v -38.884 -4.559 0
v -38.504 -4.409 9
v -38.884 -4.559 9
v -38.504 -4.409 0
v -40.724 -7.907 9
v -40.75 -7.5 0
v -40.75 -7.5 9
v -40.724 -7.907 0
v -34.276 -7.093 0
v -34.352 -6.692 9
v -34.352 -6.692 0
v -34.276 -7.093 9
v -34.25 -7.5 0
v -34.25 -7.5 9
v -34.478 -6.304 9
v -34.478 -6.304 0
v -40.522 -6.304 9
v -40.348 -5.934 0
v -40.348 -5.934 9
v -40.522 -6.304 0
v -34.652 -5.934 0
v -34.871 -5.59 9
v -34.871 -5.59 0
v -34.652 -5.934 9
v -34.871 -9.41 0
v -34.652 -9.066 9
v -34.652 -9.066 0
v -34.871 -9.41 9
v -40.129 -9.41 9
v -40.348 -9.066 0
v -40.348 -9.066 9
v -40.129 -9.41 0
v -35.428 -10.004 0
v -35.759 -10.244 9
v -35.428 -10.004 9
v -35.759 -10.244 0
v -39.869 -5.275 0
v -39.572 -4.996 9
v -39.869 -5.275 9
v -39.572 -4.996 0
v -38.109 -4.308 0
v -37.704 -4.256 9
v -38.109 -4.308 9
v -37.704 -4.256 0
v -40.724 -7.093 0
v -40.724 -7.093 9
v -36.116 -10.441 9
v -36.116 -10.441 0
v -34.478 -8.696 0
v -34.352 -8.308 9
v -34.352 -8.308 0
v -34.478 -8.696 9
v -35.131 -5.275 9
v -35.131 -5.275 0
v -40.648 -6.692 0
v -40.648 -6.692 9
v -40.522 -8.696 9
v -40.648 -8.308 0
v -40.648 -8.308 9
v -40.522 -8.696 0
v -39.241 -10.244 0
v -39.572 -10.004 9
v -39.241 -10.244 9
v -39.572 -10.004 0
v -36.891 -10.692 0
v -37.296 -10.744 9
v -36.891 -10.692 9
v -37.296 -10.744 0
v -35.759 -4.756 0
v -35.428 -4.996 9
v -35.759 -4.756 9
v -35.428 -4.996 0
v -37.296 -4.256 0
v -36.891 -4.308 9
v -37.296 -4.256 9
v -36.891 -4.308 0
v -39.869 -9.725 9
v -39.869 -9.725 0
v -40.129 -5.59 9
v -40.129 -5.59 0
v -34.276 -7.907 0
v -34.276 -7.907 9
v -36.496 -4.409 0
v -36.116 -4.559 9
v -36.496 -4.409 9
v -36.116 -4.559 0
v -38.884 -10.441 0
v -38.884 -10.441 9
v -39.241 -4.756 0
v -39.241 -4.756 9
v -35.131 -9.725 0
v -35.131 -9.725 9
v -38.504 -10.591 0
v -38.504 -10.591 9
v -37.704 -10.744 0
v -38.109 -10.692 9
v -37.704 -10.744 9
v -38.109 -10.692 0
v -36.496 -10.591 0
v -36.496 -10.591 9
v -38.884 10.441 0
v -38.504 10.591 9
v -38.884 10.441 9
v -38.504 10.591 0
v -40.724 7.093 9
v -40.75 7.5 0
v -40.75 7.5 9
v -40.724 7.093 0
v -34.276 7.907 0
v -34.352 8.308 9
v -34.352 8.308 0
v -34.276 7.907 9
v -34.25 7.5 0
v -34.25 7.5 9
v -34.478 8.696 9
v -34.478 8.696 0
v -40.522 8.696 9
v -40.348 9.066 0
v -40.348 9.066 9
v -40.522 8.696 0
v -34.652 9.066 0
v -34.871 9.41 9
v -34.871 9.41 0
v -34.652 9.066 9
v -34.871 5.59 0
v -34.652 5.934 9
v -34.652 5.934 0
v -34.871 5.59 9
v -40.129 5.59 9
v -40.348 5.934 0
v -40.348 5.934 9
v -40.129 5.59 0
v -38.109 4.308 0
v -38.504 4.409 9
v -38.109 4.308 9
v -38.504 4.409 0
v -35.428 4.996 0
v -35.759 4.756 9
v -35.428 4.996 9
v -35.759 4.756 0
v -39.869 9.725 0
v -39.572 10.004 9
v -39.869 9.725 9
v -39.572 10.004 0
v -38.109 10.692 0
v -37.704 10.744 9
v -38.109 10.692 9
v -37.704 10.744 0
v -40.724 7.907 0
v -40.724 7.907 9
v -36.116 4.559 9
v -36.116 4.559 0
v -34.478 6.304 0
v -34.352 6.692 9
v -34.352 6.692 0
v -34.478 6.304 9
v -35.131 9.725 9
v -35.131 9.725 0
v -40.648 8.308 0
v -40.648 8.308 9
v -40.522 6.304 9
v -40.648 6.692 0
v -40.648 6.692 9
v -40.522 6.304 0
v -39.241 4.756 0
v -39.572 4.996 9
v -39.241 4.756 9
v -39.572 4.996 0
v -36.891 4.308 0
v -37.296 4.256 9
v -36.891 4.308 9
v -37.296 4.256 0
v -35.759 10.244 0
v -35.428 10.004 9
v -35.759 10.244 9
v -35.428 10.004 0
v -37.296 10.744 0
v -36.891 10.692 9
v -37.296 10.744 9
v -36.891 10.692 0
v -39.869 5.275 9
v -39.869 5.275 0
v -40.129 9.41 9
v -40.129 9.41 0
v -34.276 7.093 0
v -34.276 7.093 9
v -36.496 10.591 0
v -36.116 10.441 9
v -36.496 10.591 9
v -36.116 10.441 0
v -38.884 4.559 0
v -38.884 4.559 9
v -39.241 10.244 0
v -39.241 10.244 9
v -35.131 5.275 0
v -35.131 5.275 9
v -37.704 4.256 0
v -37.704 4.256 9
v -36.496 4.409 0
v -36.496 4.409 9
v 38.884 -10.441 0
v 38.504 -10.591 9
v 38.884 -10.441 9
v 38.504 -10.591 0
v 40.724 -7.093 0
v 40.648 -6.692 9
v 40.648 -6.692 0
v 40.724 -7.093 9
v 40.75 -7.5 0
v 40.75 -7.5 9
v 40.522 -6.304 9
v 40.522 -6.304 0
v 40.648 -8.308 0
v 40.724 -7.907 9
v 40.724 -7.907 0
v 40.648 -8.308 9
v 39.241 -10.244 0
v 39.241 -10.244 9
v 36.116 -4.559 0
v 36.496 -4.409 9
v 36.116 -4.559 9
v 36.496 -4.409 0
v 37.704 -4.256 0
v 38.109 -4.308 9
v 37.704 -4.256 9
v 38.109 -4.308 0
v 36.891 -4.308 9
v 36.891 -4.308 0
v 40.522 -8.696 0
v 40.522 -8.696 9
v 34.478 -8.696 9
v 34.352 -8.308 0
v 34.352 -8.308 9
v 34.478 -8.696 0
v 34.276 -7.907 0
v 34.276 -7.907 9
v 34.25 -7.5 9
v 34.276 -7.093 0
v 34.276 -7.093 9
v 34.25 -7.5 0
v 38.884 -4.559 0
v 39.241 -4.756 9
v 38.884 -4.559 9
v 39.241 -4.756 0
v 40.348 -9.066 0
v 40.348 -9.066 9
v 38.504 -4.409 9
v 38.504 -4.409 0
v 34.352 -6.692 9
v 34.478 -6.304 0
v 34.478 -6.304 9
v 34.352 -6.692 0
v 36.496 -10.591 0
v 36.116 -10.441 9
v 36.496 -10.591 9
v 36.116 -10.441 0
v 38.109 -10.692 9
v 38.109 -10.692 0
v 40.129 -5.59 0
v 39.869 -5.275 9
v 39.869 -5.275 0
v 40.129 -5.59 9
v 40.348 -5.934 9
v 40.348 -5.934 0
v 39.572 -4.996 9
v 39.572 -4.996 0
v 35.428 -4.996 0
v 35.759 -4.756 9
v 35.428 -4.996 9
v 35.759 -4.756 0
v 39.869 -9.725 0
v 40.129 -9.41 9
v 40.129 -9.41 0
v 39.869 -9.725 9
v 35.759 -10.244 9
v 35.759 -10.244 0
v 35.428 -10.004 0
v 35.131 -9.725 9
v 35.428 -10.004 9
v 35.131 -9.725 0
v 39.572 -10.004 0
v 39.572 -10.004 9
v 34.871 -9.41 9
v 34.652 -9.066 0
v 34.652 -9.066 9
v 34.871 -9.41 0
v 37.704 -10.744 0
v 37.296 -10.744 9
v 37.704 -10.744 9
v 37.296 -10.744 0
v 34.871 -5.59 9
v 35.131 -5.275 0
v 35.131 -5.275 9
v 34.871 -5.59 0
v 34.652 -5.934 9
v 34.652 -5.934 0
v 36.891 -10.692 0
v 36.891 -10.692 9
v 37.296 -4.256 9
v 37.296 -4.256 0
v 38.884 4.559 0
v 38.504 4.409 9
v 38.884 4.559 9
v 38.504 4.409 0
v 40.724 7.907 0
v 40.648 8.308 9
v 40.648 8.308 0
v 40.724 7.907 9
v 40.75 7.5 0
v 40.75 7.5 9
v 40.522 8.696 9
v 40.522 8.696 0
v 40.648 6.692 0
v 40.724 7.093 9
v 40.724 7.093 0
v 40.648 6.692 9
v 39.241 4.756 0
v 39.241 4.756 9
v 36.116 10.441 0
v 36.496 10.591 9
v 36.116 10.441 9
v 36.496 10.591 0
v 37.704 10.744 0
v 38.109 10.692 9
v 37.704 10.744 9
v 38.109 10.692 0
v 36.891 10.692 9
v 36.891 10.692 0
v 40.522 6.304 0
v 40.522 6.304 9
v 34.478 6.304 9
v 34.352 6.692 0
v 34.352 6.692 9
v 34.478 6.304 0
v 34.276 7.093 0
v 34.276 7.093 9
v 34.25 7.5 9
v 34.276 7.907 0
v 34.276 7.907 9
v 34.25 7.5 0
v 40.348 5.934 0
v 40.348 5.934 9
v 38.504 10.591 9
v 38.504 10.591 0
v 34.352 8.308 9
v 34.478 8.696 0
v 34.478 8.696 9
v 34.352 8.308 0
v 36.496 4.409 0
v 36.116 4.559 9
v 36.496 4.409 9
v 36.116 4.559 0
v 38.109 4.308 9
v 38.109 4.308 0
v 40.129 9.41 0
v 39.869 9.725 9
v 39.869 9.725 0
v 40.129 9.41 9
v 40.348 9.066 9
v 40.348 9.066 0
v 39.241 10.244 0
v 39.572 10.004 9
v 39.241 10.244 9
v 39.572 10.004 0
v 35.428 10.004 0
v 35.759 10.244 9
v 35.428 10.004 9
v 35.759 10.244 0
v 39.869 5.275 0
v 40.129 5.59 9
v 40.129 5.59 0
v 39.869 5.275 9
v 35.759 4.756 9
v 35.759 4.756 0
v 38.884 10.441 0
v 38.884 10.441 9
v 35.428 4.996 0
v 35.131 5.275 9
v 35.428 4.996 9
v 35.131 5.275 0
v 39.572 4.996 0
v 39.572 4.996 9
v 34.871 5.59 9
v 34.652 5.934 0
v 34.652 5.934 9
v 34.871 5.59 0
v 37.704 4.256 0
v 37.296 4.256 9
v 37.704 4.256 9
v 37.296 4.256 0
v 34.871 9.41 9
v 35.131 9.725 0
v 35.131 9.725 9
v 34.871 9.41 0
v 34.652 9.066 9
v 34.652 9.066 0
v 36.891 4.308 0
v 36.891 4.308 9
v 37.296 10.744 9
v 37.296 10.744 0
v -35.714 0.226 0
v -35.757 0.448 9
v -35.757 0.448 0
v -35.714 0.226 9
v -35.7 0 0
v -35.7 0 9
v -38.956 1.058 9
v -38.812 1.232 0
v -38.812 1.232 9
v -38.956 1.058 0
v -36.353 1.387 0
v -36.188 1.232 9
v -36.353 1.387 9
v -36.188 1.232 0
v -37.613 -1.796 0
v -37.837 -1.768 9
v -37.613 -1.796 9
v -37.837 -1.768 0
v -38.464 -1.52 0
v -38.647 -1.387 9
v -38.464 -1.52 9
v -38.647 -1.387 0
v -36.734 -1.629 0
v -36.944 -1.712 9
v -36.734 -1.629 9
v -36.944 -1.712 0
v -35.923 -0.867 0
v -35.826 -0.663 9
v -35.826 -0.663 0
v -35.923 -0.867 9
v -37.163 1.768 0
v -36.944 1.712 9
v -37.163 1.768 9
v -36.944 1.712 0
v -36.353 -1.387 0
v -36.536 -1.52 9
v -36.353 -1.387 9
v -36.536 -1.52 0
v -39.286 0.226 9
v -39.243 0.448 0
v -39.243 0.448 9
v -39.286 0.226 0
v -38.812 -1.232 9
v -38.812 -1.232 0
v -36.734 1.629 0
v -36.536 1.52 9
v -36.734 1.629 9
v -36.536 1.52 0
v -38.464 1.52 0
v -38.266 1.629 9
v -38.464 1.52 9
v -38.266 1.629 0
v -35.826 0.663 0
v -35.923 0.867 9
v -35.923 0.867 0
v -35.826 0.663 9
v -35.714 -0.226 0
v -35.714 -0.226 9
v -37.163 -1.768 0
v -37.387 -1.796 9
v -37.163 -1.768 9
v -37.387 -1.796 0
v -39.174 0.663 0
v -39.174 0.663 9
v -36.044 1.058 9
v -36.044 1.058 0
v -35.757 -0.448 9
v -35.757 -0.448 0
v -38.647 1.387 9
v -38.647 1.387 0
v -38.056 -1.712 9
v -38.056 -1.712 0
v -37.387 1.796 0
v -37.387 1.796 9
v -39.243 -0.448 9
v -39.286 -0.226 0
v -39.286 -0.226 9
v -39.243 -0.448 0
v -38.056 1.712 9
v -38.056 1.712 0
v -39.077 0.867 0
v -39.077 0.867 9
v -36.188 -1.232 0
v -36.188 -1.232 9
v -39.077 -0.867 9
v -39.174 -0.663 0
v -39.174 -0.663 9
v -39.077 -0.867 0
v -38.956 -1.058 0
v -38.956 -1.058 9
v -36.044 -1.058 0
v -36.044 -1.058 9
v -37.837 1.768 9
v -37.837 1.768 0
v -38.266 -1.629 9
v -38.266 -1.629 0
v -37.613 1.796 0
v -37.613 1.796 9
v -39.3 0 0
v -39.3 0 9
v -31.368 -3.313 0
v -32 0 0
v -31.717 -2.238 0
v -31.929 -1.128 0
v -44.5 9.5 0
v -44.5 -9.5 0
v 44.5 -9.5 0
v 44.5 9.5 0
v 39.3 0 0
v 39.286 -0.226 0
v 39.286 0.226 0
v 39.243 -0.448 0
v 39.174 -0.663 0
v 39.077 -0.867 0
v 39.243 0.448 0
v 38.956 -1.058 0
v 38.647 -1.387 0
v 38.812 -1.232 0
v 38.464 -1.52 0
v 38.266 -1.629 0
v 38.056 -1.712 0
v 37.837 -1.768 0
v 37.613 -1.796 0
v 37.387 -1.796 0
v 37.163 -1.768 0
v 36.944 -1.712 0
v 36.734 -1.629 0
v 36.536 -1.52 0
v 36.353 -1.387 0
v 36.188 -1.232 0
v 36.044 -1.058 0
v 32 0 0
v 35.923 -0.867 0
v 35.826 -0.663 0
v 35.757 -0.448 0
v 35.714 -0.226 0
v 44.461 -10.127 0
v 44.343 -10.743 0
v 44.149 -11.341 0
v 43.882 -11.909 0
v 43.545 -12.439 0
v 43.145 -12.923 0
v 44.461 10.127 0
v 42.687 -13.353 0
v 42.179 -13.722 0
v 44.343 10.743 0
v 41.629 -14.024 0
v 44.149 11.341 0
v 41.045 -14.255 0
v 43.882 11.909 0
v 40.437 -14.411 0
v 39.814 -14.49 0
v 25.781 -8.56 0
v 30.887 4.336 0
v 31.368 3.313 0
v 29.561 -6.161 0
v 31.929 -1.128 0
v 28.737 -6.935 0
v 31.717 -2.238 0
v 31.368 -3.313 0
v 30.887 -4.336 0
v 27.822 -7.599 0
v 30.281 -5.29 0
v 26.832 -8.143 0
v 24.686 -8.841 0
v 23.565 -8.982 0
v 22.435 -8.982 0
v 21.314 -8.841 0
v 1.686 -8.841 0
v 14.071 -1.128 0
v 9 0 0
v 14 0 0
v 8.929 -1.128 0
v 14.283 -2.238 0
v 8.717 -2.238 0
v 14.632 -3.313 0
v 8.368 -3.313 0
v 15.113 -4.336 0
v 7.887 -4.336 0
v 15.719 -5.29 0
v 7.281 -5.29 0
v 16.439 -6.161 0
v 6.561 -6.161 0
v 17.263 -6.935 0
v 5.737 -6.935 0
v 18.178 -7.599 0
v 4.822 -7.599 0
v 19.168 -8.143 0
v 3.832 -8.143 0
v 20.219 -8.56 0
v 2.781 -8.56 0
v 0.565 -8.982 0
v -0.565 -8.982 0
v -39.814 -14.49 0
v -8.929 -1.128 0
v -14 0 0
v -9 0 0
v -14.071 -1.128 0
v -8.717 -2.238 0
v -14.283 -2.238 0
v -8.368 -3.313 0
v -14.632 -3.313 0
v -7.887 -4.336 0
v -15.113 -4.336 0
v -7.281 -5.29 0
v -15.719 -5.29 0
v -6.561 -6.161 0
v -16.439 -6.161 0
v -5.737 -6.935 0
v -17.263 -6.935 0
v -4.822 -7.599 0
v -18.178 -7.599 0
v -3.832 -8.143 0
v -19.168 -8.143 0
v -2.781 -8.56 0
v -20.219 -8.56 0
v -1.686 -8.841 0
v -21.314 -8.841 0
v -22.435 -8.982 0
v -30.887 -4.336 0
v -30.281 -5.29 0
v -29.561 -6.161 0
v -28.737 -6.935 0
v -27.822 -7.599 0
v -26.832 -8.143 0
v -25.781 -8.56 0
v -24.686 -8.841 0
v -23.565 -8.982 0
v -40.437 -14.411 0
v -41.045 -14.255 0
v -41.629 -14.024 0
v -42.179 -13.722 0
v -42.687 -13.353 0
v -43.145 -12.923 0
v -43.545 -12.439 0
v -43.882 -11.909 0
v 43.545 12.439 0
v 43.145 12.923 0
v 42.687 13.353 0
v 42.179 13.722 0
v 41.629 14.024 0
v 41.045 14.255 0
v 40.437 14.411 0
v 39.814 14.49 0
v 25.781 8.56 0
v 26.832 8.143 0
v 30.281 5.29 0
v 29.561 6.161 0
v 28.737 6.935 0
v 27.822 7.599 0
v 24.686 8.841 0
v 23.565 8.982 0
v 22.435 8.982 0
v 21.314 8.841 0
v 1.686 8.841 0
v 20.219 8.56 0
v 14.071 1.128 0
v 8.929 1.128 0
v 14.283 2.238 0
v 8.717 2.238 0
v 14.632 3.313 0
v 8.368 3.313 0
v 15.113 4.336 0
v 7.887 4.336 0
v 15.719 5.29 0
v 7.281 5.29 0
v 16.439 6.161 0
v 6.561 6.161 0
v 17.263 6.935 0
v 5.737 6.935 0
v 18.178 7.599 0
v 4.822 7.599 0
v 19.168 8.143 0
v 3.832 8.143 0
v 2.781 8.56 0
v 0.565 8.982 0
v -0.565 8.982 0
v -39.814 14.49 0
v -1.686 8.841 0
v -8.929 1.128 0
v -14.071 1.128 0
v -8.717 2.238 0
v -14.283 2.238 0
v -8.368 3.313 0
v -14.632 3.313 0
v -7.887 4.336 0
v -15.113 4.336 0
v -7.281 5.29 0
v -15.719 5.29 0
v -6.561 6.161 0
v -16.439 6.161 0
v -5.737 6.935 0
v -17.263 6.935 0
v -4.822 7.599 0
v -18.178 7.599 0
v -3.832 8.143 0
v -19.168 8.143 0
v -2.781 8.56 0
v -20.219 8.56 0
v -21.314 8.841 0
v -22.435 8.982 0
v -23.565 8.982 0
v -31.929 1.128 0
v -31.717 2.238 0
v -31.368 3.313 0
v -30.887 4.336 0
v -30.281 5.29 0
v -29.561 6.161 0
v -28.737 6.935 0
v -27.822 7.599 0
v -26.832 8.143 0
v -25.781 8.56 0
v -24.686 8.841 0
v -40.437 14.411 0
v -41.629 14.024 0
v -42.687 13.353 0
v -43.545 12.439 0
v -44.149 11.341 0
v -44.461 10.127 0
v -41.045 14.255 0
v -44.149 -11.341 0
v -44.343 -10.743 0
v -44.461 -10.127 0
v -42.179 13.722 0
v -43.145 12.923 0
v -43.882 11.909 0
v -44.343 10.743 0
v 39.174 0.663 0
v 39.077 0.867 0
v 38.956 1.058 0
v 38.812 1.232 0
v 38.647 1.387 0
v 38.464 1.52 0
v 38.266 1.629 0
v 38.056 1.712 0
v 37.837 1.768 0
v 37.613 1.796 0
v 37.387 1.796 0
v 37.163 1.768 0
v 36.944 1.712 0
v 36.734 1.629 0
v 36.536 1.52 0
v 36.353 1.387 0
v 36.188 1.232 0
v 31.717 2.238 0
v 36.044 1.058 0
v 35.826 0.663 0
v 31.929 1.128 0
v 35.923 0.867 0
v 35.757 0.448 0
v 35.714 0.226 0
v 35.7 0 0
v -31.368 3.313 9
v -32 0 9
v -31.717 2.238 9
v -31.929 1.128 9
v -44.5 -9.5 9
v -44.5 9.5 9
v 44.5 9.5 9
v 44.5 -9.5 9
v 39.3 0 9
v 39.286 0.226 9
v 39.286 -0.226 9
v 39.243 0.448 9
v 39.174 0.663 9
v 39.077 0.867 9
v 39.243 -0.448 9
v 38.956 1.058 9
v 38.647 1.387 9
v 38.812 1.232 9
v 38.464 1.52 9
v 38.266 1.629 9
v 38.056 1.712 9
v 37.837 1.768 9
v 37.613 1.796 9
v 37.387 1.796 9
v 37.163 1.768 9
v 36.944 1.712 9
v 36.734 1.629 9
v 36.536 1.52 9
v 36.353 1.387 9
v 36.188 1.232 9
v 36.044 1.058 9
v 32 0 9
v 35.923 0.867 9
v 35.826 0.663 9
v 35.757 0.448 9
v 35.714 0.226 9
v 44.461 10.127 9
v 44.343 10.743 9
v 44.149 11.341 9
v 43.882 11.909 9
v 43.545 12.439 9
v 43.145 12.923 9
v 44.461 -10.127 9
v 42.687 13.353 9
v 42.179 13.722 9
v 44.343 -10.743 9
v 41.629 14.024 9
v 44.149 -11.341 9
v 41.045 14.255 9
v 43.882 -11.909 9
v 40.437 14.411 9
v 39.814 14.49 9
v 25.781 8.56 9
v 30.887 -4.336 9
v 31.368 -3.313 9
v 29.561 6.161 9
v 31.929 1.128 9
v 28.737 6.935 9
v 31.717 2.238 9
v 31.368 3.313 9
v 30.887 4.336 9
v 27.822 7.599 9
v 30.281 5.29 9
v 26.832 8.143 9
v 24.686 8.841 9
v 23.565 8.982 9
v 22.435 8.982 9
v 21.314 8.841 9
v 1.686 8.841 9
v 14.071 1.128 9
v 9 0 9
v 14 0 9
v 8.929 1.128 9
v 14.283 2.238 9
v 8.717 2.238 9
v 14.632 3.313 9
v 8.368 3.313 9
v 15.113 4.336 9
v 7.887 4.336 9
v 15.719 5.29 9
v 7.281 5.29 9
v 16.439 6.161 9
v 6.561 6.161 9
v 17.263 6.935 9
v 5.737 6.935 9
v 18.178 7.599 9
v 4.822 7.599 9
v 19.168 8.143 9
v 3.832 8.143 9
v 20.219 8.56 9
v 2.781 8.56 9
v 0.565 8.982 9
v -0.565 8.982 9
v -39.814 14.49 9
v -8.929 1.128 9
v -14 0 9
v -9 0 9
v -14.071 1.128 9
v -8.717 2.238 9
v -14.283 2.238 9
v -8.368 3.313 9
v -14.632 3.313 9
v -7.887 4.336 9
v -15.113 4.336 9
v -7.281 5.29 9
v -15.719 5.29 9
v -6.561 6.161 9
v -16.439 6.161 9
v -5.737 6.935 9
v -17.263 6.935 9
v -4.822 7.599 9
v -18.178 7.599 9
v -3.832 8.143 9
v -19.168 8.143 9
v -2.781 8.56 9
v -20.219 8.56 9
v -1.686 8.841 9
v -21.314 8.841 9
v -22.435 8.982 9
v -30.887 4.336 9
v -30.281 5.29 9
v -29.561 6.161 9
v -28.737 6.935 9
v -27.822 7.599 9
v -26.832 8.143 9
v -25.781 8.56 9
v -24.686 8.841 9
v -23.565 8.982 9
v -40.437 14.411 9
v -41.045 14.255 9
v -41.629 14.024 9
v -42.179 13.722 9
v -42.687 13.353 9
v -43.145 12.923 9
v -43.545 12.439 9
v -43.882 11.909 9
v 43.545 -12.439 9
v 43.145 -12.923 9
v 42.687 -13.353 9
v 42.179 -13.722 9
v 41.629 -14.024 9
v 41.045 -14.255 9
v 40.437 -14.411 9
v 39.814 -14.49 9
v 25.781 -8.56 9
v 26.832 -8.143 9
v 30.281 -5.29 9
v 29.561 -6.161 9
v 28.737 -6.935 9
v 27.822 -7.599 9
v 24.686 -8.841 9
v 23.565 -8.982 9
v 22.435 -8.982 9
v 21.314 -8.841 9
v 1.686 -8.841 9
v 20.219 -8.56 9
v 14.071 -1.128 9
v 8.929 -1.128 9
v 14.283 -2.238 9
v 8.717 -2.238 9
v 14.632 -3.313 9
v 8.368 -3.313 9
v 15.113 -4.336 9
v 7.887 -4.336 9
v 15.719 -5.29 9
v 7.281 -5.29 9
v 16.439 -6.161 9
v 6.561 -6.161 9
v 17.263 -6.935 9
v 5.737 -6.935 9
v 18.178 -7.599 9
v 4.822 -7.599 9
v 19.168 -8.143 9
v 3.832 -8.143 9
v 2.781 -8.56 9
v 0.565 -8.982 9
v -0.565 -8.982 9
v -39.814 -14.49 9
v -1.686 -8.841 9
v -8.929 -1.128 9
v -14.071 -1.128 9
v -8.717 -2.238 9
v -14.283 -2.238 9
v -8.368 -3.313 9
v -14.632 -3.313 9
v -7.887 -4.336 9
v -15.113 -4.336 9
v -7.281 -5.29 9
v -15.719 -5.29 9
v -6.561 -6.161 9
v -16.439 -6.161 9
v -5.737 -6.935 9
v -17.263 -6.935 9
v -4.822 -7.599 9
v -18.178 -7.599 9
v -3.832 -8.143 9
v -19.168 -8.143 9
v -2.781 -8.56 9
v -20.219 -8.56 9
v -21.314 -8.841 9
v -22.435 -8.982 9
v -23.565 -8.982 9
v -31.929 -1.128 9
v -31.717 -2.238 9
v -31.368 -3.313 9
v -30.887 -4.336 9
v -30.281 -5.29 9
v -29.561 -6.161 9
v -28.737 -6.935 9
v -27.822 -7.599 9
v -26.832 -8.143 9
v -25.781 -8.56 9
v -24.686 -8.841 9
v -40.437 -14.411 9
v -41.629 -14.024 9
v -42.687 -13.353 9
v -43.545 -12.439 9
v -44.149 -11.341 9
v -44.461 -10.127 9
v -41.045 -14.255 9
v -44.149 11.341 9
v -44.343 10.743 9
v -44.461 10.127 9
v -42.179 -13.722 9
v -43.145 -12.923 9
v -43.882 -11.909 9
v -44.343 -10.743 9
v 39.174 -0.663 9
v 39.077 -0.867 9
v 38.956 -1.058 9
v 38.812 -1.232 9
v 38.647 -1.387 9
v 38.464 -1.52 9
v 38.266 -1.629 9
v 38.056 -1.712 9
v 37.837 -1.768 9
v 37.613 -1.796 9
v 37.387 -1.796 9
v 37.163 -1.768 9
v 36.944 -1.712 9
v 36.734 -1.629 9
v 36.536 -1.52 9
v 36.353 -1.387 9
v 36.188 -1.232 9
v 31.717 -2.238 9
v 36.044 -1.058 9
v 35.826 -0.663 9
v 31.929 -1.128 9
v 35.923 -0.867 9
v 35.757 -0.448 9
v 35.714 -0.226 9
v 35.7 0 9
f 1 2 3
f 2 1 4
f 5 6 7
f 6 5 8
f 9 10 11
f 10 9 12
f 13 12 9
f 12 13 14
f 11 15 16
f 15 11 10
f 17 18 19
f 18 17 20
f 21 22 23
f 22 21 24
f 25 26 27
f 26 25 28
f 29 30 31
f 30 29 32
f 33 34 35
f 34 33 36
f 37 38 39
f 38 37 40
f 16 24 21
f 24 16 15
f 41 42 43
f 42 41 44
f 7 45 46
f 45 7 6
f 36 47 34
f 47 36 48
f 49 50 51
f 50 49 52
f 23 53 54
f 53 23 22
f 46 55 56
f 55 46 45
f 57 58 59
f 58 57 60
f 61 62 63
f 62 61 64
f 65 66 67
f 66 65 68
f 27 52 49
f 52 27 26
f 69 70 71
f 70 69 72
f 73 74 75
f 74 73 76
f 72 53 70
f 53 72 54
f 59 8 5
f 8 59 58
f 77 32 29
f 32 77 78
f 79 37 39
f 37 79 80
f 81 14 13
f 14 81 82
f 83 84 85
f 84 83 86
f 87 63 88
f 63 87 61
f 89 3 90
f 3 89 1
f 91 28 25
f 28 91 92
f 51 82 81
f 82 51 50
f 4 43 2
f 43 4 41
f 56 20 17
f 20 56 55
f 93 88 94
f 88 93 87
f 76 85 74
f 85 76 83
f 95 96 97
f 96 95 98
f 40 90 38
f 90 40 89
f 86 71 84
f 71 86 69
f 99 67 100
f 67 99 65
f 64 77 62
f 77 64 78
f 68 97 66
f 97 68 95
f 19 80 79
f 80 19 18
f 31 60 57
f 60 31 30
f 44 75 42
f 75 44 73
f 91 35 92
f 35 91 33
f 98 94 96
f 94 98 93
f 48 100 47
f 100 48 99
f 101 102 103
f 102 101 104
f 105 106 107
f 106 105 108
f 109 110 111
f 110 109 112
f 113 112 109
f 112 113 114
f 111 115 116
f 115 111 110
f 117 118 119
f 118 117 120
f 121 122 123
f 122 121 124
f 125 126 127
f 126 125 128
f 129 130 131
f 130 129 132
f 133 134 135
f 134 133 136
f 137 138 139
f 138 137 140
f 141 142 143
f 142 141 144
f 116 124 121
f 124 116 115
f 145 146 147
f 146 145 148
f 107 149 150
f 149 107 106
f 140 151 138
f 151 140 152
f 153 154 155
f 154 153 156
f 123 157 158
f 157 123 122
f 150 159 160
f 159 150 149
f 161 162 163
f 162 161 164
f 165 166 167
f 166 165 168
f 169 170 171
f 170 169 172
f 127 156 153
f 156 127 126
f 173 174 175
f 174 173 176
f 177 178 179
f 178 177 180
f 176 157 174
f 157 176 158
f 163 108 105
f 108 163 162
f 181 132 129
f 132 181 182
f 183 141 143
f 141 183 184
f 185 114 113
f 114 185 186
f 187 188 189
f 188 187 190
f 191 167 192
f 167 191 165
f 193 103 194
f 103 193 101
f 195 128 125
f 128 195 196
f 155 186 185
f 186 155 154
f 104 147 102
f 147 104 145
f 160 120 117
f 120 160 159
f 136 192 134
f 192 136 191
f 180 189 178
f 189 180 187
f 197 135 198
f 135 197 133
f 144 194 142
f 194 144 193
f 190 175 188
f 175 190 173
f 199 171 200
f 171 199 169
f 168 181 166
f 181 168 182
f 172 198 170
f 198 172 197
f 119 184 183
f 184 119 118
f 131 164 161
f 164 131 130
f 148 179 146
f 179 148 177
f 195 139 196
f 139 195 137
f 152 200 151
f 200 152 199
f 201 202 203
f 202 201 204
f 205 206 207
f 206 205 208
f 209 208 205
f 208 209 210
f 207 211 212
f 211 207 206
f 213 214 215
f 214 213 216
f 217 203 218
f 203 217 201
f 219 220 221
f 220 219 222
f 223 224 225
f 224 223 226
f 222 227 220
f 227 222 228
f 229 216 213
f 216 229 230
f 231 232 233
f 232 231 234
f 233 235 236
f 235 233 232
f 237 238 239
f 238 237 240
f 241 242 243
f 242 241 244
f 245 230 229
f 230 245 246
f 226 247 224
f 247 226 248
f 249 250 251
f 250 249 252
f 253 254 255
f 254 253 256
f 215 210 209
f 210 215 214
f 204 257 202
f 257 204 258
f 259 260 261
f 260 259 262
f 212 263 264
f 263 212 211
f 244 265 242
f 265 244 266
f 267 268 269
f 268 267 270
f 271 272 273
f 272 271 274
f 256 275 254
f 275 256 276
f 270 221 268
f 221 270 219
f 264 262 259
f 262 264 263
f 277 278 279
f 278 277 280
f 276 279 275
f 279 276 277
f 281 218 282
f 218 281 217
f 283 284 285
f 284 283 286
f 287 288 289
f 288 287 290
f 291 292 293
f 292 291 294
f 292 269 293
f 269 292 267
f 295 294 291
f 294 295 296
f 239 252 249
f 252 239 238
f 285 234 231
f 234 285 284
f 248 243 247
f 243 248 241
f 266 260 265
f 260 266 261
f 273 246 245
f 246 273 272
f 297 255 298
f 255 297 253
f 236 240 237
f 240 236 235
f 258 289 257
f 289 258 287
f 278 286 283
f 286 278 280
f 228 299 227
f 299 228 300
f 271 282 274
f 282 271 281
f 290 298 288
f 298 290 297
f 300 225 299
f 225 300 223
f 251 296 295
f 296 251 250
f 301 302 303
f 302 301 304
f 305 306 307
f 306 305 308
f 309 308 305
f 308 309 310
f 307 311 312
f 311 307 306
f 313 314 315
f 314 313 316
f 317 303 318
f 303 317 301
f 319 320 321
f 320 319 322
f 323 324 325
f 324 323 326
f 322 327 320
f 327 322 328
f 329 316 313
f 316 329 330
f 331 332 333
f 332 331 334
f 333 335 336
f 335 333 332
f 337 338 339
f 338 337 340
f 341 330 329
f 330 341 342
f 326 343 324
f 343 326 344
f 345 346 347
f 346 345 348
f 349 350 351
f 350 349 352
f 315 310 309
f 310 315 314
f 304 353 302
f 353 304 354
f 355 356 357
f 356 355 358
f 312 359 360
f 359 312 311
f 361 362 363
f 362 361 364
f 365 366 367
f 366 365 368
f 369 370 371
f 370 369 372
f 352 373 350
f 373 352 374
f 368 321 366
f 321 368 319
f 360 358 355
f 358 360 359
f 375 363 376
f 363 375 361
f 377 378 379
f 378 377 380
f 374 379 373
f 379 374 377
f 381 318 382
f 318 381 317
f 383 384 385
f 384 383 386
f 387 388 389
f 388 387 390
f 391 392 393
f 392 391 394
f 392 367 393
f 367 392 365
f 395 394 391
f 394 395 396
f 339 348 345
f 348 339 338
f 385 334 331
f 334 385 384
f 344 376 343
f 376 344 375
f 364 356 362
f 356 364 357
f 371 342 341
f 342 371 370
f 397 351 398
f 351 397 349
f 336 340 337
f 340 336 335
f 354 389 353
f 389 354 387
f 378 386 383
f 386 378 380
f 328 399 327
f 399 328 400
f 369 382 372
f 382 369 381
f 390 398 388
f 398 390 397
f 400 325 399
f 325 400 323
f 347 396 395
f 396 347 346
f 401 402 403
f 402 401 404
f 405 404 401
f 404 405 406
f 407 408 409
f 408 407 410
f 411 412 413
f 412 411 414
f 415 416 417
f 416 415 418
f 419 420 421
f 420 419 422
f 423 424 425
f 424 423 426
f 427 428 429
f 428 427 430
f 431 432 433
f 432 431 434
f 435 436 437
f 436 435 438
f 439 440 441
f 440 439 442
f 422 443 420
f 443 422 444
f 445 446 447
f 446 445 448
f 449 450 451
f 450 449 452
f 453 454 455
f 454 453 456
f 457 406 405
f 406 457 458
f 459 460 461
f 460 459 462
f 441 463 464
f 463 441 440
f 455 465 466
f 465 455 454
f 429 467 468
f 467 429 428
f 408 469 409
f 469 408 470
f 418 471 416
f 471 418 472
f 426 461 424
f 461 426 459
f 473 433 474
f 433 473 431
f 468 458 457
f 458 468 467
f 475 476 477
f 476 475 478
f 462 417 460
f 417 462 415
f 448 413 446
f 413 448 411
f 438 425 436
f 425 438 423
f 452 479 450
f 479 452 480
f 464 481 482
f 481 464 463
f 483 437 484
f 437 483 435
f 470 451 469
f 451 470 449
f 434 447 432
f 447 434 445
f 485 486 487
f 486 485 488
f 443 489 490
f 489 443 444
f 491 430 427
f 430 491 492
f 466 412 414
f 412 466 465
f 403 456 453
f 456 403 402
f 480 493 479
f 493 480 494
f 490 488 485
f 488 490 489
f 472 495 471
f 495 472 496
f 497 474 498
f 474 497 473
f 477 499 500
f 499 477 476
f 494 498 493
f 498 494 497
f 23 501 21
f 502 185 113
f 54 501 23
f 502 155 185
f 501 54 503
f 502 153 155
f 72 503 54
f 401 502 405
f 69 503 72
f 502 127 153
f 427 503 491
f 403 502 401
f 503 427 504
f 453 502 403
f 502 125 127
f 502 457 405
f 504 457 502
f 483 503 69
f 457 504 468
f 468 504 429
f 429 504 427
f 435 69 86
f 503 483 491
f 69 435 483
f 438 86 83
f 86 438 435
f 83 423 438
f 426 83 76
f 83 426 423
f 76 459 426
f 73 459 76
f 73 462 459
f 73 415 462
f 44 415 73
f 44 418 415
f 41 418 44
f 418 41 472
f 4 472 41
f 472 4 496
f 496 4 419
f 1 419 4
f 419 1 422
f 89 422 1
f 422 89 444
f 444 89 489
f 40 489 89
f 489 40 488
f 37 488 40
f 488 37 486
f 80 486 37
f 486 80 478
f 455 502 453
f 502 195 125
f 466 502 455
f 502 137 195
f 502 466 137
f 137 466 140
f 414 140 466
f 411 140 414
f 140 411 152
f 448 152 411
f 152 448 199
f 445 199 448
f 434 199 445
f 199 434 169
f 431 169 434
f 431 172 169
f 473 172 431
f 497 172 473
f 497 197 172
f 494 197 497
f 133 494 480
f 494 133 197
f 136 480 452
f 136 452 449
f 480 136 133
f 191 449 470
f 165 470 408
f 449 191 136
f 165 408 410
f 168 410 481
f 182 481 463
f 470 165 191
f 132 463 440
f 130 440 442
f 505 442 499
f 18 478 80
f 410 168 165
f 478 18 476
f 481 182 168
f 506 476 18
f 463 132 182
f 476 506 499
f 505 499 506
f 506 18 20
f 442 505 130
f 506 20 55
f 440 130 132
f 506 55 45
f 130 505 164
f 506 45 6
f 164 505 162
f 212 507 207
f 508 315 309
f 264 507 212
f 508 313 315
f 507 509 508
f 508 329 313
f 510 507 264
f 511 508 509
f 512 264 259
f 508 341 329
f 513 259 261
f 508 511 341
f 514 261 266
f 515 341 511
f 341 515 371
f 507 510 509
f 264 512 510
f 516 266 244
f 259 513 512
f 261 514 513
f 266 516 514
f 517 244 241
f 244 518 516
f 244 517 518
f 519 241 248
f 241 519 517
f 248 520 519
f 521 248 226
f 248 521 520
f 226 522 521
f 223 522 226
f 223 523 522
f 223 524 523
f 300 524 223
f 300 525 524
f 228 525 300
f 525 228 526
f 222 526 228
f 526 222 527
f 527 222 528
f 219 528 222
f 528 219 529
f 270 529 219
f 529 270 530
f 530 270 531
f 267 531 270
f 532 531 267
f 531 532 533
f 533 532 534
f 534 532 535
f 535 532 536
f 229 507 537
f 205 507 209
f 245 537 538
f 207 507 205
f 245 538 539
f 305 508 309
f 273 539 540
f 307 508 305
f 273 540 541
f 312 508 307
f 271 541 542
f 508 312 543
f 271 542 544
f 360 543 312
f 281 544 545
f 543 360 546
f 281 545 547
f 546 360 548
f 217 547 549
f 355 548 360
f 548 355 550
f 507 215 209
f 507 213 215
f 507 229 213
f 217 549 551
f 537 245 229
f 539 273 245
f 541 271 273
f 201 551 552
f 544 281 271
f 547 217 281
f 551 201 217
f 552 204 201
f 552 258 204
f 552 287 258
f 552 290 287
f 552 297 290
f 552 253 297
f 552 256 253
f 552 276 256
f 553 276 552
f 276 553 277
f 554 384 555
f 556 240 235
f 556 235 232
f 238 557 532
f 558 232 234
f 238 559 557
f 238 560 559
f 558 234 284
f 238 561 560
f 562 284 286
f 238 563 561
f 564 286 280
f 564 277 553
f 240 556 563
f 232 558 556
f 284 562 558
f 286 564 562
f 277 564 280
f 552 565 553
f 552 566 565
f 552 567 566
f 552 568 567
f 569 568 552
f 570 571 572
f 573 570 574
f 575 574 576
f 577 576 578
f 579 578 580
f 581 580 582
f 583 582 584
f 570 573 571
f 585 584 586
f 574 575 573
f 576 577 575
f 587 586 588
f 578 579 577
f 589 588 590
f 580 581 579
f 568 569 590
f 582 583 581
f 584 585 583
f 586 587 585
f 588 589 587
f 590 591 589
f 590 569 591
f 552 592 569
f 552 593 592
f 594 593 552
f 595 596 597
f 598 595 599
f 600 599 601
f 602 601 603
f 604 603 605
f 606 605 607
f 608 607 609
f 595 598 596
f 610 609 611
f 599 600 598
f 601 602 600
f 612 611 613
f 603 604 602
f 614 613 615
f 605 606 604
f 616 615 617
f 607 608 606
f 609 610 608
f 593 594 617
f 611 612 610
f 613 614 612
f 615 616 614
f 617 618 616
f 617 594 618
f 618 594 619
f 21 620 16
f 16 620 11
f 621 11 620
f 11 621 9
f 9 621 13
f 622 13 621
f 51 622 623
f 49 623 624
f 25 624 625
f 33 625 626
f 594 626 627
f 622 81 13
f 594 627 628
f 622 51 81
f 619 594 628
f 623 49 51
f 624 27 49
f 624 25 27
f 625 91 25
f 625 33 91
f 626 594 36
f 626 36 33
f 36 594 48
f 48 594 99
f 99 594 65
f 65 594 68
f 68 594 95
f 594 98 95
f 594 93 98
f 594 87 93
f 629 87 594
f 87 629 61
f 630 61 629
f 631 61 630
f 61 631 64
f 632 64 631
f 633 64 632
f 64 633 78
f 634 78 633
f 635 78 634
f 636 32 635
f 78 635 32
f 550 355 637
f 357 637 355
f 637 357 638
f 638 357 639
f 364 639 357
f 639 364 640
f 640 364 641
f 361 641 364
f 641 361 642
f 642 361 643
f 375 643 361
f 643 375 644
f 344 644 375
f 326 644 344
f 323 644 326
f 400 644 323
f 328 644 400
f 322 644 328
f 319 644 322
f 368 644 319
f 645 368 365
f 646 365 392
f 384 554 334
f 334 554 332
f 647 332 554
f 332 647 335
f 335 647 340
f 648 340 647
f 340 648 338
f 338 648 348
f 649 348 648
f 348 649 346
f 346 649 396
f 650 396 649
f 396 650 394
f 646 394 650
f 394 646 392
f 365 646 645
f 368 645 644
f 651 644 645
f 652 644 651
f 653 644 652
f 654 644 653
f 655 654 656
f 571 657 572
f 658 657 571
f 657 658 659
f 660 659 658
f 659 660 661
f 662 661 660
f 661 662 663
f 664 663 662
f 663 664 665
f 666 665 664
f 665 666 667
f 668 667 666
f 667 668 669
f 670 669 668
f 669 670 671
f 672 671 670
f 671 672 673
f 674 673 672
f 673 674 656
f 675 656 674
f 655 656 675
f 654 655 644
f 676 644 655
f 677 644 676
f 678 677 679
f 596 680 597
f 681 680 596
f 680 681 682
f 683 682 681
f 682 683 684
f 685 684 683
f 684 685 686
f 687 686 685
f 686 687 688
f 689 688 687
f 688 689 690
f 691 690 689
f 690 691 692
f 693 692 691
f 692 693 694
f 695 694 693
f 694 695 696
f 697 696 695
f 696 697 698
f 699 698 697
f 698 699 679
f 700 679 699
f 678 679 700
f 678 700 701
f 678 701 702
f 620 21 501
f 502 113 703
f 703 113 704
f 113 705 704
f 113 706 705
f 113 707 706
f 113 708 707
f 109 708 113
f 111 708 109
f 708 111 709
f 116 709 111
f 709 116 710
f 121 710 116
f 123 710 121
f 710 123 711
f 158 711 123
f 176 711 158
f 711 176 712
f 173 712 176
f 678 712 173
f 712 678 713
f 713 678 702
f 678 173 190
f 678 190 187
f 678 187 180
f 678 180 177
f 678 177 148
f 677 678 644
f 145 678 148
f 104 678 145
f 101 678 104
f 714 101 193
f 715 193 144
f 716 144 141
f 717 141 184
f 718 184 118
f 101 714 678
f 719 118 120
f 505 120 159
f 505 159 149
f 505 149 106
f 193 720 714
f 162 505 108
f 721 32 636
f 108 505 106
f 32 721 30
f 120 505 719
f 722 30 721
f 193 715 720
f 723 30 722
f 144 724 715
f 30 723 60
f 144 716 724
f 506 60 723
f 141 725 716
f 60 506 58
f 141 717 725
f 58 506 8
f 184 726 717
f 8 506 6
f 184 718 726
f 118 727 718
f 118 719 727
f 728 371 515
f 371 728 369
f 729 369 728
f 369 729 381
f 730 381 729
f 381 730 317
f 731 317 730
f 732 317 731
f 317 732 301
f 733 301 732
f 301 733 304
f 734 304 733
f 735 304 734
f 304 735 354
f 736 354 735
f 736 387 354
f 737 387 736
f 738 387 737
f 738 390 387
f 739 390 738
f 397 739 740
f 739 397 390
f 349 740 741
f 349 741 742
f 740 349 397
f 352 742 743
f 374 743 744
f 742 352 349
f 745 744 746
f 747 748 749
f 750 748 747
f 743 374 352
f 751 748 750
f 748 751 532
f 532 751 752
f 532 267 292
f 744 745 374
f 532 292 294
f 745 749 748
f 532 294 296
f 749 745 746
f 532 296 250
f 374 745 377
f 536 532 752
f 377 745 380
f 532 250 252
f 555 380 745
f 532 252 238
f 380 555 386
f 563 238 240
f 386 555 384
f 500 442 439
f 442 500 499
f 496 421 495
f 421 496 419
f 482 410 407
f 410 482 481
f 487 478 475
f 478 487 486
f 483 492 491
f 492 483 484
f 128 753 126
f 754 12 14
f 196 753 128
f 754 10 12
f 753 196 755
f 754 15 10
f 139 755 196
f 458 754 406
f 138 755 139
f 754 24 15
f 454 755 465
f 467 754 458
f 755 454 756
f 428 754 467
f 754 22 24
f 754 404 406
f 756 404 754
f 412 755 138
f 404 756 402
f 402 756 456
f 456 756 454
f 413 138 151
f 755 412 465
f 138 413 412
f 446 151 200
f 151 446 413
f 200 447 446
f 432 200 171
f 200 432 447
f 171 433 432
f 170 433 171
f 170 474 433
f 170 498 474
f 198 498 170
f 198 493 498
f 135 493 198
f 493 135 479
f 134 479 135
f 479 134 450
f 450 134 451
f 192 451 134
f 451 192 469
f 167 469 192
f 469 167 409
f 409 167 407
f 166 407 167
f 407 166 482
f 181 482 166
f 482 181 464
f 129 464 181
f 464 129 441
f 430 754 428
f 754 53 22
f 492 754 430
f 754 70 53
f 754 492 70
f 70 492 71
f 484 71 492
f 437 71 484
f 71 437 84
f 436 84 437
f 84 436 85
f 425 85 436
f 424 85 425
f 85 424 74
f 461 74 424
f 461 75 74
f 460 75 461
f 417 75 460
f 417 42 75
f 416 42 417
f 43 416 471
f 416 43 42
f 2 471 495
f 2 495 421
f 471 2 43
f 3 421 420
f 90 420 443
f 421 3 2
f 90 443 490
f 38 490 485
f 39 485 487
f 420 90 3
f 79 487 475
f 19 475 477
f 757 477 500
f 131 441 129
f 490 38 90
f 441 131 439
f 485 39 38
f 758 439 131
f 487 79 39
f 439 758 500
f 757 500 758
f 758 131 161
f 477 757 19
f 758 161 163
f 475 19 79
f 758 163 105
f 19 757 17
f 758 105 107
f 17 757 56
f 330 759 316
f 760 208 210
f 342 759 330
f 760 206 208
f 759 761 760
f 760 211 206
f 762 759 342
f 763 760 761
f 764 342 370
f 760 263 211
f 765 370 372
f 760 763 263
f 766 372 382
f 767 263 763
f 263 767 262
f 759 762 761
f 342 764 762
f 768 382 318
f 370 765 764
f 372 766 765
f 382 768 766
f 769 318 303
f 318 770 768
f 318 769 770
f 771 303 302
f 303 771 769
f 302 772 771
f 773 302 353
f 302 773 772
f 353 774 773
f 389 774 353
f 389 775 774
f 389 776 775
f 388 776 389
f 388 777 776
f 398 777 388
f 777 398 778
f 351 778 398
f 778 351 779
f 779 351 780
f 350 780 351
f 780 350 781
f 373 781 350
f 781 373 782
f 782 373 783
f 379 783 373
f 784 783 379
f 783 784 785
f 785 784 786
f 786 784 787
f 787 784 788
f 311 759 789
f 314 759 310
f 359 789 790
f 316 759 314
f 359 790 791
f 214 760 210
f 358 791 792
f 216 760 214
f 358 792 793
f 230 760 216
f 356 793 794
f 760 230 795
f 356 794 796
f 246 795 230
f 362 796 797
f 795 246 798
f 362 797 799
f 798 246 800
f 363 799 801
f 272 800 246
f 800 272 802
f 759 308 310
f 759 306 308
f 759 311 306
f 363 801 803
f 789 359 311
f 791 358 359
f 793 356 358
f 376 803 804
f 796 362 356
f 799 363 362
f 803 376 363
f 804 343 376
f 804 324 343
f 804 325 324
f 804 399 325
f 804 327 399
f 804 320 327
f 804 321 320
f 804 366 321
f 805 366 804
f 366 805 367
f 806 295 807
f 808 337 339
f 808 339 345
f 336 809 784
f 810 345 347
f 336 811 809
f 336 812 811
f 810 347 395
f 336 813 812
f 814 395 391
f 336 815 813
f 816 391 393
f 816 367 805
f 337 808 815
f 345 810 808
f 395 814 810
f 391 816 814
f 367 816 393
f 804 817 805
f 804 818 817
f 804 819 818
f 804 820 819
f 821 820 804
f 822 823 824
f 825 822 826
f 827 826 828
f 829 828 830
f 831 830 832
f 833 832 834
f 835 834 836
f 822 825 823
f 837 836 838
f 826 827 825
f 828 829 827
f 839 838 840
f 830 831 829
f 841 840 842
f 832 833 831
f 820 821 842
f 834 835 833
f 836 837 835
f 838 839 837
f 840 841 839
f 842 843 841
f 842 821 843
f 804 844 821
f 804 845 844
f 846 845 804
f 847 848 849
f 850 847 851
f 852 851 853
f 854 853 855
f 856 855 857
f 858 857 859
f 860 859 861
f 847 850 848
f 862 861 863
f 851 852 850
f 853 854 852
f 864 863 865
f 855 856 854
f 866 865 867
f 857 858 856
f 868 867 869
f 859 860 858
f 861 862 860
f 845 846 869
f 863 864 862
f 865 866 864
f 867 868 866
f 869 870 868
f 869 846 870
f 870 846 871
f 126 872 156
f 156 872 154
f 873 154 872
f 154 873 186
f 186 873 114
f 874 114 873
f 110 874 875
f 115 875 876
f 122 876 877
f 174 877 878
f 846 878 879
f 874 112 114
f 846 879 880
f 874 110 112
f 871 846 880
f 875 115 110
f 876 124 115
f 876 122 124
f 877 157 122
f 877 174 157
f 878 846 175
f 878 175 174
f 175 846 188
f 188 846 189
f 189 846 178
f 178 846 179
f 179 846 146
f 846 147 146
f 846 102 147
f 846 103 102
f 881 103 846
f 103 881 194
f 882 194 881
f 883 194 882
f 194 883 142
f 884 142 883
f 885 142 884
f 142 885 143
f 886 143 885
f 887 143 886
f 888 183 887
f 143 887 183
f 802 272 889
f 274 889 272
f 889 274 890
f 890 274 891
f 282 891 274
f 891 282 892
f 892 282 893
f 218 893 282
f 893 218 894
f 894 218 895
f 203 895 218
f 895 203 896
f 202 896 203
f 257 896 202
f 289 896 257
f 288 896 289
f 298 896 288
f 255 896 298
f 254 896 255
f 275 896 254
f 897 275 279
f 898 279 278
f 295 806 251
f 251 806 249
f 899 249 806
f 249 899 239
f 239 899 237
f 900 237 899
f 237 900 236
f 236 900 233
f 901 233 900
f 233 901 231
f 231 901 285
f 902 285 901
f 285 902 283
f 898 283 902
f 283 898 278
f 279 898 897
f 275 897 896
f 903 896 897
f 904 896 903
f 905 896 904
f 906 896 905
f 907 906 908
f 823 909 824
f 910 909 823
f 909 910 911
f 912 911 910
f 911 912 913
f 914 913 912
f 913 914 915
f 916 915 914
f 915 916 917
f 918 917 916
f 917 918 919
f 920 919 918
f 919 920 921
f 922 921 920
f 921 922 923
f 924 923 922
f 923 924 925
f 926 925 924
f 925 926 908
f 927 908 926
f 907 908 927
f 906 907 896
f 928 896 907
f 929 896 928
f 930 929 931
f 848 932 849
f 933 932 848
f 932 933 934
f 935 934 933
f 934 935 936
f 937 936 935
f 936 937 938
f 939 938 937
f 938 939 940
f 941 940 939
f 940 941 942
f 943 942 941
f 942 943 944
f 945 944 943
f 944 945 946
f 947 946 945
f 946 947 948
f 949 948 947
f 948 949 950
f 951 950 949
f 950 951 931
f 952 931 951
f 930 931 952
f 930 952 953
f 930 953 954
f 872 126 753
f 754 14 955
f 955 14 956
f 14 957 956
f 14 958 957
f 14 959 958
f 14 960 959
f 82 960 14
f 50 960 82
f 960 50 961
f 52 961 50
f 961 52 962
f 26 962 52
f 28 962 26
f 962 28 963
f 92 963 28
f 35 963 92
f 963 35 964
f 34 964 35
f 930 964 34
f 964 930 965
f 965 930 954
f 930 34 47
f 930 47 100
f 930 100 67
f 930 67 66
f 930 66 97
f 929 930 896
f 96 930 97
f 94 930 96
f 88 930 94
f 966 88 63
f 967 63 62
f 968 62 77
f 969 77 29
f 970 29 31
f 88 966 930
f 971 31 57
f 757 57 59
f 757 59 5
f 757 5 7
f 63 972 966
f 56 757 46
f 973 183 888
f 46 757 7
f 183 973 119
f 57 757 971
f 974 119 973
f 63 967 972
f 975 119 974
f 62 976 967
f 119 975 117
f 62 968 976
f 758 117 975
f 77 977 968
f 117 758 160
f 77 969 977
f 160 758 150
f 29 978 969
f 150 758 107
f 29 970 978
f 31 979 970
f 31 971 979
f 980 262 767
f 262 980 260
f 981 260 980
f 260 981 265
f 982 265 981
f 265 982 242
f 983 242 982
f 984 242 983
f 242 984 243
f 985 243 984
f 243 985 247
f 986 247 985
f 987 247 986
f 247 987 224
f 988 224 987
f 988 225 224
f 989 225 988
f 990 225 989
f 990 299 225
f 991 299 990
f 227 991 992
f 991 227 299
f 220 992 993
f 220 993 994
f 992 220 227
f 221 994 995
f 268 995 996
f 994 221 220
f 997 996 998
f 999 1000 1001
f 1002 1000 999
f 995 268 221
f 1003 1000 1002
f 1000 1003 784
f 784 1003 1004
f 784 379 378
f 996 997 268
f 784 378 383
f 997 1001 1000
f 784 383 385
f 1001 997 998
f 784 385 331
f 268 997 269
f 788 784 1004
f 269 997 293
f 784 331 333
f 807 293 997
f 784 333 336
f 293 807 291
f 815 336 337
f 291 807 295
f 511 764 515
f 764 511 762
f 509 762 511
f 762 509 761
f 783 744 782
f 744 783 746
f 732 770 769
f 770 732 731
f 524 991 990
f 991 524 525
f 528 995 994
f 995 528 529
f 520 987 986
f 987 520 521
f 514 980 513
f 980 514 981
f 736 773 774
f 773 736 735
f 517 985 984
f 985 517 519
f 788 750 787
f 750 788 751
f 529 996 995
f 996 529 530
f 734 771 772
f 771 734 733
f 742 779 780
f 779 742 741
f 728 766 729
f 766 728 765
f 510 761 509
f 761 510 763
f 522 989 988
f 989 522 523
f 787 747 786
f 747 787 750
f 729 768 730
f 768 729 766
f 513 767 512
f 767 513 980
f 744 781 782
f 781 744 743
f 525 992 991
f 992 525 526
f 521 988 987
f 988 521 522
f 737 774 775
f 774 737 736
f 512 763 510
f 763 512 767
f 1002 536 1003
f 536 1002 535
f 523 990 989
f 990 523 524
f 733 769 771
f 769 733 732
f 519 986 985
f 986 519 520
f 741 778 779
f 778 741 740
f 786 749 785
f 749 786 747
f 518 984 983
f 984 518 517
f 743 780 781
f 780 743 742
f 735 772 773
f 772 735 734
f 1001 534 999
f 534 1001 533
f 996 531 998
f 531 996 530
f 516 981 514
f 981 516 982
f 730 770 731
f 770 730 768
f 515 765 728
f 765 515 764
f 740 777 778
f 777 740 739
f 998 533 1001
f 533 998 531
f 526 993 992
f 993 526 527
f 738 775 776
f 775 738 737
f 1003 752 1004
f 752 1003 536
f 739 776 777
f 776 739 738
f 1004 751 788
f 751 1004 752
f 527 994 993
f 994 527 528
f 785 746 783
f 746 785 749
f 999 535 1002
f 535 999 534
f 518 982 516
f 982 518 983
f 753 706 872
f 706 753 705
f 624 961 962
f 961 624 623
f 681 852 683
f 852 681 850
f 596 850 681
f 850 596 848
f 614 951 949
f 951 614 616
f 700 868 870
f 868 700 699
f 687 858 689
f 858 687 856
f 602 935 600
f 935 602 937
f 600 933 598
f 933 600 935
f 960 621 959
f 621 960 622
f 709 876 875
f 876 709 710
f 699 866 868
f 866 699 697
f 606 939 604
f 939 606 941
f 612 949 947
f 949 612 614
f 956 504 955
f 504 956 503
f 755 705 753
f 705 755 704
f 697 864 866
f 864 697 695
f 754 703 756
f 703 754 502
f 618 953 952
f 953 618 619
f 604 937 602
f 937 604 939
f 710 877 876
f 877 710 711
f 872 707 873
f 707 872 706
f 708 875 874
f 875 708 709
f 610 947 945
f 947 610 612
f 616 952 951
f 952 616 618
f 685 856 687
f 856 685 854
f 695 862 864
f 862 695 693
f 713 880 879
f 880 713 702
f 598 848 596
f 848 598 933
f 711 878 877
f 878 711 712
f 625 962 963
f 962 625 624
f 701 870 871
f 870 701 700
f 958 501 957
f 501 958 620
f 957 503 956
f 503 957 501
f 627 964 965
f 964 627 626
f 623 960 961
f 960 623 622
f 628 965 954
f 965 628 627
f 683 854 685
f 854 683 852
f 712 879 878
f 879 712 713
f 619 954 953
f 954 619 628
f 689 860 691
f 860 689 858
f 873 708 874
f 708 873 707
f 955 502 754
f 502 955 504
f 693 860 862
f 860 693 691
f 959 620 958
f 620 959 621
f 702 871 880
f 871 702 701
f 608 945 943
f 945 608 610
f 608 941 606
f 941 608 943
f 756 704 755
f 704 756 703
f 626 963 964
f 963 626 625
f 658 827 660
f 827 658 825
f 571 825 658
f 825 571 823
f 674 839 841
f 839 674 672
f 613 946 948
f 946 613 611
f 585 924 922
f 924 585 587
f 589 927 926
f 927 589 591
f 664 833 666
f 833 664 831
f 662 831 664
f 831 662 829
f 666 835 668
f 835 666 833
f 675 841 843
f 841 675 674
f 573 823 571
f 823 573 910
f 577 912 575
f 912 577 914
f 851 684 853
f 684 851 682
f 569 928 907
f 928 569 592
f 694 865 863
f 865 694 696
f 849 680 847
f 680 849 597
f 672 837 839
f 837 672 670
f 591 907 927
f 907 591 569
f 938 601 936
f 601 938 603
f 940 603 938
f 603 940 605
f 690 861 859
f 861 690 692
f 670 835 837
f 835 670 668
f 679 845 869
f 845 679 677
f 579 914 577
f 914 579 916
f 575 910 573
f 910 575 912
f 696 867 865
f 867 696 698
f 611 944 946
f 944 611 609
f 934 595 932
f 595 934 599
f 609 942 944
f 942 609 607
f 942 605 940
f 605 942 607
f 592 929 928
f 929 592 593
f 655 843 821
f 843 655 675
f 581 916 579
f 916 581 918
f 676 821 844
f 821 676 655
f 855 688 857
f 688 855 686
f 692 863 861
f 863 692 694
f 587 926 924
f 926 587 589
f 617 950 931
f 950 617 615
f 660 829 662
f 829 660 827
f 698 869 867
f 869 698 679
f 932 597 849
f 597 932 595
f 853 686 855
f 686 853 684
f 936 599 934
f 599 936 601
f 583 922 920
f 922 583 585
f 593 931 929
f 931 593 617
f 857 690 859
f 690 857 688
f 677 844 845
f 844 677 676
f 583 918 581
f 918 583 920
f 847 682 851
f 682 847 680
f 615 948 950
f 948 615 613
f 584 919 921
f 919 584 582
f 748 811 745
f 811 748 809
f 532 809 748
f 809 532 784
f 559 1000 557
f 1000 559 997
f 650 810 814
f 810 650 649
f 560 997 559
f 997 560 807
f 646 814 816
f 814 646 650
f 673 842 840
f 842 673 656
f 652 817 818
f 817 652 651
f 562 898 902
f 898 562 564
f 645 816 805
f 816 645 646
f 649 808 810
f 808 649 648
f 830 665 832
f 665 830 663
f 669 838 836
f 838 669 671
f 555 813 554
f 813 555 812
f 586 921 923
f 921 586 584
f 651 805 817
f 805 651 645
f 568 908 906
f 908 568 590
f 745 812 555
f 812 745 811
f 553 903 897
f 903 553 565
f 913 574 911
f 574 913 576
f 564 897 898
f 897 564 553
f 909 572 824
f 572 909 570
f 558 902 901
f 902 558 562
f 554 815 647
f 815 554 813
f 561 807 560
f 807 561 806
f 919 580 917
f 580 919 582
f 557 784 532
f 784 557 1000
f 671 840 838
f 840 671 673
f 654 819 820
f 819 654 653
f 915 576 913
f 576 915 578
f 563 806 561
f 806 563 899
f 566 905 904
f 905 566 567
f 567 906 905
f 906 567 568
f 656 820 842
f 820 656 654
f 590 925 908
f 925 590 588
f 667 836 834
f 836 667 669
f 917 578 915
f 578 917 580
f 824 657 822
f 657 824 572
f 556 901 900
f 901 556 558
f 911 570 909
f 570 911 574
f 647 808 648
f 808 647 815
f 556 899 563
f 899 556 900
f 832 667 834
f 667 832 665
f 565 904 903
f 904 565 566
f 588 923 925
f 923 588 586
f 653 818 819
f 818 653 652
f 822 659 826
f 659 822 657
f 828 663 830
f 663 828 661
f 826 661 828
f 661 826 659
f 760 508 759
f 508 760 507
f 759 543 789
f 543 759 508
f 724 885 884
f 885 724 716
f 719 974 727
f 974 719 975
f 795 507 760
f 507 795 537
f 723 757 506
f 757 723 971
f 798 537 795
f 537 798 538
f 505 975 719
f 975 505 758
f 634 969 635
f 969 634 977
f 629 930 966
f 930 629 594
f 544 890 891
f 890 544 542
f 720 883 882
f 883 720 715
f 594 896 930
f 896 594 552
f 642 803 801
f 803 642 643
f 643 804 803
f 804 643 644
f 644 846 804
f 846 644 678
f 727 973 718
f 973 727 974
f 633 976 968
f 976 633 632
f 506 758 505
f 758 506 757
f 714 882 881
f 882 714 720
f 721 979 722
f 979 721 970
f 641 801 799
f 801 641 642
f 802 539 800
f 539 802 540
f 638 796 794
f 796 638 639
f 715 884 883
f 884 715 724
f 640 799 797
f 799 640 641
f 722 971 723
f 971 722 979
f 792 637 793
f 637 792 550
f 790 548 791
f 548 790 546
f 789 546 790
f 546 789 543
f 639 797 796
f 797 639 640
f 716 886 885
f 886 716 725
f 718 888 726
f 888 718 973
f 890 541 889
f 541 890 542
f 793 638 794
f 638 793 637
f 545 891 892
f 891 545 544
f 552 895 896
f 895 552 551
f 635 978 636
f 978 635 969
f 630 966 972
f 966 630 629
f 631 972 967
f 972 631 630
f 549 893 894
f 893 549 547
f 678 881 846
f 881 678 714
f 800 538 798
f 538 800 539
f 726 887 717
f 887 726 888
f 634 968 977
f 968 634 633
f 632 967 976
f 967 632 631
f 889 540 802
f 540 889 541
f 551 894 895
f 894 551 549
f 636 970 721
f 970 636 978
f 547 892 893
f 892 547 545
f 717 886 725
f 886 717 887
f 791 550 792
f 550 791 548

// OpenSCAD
$fn = 50;


difference() {
	union() {
		hull() {
			translate(v = [-39.5000000000, 9.5000000000, 0]) {
				cylinder(h = 9, r = 5);
			}
			translate(v = [39.5000000000, 9.5000000000, 0]) {
				cylinder(h = 9, r = 5);
			}
			translate(v = [-39.5000000000, -9.5000000000, 0]) {
				cylinder(h = 9, r = 5);
			}
			translate(v = [39.5000000000, -9.5000000000, 0]) {
				cylinder(h = 9, r = 5);
			}
		}
	}
	union() {
		#translate(v = [-37.5000000000, -7.5000000000, 0]) {
			cylinder(h = 9, r = 3.2500000000);
		}
		#translate(v = [-37.5000000000, 7.5000000000, 0]) {
			cylinder(h = 9, r = 3.2500000000);
		}
		#translate(v = [37.5000000000, -7.5000000000, 0]) {
			cylinder(h = 9, r = 3.2500000000);
		}
		#translate(v = [37.5000000000, 7.5000000000, 0]) {
			cylinder(h = 9, r = 3.2500000000);
		}
		#translate(v = [-37.5000000000, -7.5000000000, -100.0000000000]) {
			cylinder(h = 200, r = 3.2500000000);
		}
		#translate(v = [-37.5000000000, 7.5000000000, -100.0000000000]) {
			cylinder(h = 200, r = 3.2500000000);
		}
		#translate(v = [37.5000000000, -7.5000000000, -100.0000000000]) {
			cylinder(h = 200, r = 3.2500000000);
		}
		#translate(v = [37.5000000000, 7.5000000000, -100.0000000000]) {
			cylinder(h = 200, r = 3.2500000000);
		}
		#translate(v = [-37.5000000000, -7.5000000000, 0]) {
			cylinder(h = 9, r = 1.8000000000);
		}
		#translate(v = [-37.5000000000, 0.0000000000, 0]) {
			cylinder(h = 9, r = 1.8000000000);
		}
		#translate(v = [-37.5000000000, 7.5000000000, 0]) {
			cylinder(h = 9, r = 1.8000000000);
		}
		#translate(v = [37.5000000000, -7.5000000000, 0]) {
			cylinder(h = 9, r = 1.8000000000);
		}
		#translate(v = [37.5000000000, 0.0000000000, 0]) {
			cylinder(h = 9, r = 1.8000000000);
		}
		#translate(v = [37.5000000000, 7.5000000000, 0]) {
			cylinder(h = 9, r = 1.8000000000);
		}
		#translate(v = [-37.5000000000, -7.5000000000, 0]) {
			cylinder(h = 9, r = 1.8000000000);
		}
		#translate(v = [-37.5000000000, 0.0000000000, 0]) {
			cylinder(h = 9, r = 1.8000000000);
		}
		#translate(v = [-37.5000000000, 7.5000000000, 0]) {
			cylinder(h = 9, r = 1.8000000000);
		}
		#translate(v = [37.5000000000, -7.5000000000, 0]) {
			cylinder(h = 9, r = 1.8000000000);
		}
		#translate(v = [37.5000000000, 0.0000000000, 0]) {
			cylinder(h = 9, r = 1.8000000000);
		}
		#translate(v = [37.5000000000, 7.5000000000, 0]) {
			cylinder(h = 9, r = 1.8000000000);
		}
		#translate(v = [-37.5000000000, -7.5000000000, 0]) {
			cylinder(h = 9, r = 1.8000000000);
		}
		#translate(v = [-37.5000000000, 0.0000000000, 0]) {
			cylinder(h = 9, r = 1.8000000000);
		}
		#translate(v = [-37.5000000000, 7.5000000000, 0]) {
			cylinder(h = 9, r = 1.8000000000);
		}
		#translate(v = [37.5000000000, -7.5000000000, 0]) {
			cylinder(h = 9, r = 1.8000000000);
		}
		#translate(v = [37.5000000000, 0.0000000000, 0]) {
			cylinder(h = 9, r = 1.8000000000);
		}
		#translate(v = [37.5000000000, 7.5000000000, 0]) {
			cylinder(h = 9, r = 1.8000000000);
		}
		#translate(v = [-23.0000000000, 0, 0]) {
			cylinder(h = 9, r = 9.0000000000);
		}
		#cylinder(h = 9, r = 9.0000000000);
		#translate(v = [23.0000000000, 0, 0]) {
			cylinder(h = 9, r = 9.0000000000);
		}
	}
}
